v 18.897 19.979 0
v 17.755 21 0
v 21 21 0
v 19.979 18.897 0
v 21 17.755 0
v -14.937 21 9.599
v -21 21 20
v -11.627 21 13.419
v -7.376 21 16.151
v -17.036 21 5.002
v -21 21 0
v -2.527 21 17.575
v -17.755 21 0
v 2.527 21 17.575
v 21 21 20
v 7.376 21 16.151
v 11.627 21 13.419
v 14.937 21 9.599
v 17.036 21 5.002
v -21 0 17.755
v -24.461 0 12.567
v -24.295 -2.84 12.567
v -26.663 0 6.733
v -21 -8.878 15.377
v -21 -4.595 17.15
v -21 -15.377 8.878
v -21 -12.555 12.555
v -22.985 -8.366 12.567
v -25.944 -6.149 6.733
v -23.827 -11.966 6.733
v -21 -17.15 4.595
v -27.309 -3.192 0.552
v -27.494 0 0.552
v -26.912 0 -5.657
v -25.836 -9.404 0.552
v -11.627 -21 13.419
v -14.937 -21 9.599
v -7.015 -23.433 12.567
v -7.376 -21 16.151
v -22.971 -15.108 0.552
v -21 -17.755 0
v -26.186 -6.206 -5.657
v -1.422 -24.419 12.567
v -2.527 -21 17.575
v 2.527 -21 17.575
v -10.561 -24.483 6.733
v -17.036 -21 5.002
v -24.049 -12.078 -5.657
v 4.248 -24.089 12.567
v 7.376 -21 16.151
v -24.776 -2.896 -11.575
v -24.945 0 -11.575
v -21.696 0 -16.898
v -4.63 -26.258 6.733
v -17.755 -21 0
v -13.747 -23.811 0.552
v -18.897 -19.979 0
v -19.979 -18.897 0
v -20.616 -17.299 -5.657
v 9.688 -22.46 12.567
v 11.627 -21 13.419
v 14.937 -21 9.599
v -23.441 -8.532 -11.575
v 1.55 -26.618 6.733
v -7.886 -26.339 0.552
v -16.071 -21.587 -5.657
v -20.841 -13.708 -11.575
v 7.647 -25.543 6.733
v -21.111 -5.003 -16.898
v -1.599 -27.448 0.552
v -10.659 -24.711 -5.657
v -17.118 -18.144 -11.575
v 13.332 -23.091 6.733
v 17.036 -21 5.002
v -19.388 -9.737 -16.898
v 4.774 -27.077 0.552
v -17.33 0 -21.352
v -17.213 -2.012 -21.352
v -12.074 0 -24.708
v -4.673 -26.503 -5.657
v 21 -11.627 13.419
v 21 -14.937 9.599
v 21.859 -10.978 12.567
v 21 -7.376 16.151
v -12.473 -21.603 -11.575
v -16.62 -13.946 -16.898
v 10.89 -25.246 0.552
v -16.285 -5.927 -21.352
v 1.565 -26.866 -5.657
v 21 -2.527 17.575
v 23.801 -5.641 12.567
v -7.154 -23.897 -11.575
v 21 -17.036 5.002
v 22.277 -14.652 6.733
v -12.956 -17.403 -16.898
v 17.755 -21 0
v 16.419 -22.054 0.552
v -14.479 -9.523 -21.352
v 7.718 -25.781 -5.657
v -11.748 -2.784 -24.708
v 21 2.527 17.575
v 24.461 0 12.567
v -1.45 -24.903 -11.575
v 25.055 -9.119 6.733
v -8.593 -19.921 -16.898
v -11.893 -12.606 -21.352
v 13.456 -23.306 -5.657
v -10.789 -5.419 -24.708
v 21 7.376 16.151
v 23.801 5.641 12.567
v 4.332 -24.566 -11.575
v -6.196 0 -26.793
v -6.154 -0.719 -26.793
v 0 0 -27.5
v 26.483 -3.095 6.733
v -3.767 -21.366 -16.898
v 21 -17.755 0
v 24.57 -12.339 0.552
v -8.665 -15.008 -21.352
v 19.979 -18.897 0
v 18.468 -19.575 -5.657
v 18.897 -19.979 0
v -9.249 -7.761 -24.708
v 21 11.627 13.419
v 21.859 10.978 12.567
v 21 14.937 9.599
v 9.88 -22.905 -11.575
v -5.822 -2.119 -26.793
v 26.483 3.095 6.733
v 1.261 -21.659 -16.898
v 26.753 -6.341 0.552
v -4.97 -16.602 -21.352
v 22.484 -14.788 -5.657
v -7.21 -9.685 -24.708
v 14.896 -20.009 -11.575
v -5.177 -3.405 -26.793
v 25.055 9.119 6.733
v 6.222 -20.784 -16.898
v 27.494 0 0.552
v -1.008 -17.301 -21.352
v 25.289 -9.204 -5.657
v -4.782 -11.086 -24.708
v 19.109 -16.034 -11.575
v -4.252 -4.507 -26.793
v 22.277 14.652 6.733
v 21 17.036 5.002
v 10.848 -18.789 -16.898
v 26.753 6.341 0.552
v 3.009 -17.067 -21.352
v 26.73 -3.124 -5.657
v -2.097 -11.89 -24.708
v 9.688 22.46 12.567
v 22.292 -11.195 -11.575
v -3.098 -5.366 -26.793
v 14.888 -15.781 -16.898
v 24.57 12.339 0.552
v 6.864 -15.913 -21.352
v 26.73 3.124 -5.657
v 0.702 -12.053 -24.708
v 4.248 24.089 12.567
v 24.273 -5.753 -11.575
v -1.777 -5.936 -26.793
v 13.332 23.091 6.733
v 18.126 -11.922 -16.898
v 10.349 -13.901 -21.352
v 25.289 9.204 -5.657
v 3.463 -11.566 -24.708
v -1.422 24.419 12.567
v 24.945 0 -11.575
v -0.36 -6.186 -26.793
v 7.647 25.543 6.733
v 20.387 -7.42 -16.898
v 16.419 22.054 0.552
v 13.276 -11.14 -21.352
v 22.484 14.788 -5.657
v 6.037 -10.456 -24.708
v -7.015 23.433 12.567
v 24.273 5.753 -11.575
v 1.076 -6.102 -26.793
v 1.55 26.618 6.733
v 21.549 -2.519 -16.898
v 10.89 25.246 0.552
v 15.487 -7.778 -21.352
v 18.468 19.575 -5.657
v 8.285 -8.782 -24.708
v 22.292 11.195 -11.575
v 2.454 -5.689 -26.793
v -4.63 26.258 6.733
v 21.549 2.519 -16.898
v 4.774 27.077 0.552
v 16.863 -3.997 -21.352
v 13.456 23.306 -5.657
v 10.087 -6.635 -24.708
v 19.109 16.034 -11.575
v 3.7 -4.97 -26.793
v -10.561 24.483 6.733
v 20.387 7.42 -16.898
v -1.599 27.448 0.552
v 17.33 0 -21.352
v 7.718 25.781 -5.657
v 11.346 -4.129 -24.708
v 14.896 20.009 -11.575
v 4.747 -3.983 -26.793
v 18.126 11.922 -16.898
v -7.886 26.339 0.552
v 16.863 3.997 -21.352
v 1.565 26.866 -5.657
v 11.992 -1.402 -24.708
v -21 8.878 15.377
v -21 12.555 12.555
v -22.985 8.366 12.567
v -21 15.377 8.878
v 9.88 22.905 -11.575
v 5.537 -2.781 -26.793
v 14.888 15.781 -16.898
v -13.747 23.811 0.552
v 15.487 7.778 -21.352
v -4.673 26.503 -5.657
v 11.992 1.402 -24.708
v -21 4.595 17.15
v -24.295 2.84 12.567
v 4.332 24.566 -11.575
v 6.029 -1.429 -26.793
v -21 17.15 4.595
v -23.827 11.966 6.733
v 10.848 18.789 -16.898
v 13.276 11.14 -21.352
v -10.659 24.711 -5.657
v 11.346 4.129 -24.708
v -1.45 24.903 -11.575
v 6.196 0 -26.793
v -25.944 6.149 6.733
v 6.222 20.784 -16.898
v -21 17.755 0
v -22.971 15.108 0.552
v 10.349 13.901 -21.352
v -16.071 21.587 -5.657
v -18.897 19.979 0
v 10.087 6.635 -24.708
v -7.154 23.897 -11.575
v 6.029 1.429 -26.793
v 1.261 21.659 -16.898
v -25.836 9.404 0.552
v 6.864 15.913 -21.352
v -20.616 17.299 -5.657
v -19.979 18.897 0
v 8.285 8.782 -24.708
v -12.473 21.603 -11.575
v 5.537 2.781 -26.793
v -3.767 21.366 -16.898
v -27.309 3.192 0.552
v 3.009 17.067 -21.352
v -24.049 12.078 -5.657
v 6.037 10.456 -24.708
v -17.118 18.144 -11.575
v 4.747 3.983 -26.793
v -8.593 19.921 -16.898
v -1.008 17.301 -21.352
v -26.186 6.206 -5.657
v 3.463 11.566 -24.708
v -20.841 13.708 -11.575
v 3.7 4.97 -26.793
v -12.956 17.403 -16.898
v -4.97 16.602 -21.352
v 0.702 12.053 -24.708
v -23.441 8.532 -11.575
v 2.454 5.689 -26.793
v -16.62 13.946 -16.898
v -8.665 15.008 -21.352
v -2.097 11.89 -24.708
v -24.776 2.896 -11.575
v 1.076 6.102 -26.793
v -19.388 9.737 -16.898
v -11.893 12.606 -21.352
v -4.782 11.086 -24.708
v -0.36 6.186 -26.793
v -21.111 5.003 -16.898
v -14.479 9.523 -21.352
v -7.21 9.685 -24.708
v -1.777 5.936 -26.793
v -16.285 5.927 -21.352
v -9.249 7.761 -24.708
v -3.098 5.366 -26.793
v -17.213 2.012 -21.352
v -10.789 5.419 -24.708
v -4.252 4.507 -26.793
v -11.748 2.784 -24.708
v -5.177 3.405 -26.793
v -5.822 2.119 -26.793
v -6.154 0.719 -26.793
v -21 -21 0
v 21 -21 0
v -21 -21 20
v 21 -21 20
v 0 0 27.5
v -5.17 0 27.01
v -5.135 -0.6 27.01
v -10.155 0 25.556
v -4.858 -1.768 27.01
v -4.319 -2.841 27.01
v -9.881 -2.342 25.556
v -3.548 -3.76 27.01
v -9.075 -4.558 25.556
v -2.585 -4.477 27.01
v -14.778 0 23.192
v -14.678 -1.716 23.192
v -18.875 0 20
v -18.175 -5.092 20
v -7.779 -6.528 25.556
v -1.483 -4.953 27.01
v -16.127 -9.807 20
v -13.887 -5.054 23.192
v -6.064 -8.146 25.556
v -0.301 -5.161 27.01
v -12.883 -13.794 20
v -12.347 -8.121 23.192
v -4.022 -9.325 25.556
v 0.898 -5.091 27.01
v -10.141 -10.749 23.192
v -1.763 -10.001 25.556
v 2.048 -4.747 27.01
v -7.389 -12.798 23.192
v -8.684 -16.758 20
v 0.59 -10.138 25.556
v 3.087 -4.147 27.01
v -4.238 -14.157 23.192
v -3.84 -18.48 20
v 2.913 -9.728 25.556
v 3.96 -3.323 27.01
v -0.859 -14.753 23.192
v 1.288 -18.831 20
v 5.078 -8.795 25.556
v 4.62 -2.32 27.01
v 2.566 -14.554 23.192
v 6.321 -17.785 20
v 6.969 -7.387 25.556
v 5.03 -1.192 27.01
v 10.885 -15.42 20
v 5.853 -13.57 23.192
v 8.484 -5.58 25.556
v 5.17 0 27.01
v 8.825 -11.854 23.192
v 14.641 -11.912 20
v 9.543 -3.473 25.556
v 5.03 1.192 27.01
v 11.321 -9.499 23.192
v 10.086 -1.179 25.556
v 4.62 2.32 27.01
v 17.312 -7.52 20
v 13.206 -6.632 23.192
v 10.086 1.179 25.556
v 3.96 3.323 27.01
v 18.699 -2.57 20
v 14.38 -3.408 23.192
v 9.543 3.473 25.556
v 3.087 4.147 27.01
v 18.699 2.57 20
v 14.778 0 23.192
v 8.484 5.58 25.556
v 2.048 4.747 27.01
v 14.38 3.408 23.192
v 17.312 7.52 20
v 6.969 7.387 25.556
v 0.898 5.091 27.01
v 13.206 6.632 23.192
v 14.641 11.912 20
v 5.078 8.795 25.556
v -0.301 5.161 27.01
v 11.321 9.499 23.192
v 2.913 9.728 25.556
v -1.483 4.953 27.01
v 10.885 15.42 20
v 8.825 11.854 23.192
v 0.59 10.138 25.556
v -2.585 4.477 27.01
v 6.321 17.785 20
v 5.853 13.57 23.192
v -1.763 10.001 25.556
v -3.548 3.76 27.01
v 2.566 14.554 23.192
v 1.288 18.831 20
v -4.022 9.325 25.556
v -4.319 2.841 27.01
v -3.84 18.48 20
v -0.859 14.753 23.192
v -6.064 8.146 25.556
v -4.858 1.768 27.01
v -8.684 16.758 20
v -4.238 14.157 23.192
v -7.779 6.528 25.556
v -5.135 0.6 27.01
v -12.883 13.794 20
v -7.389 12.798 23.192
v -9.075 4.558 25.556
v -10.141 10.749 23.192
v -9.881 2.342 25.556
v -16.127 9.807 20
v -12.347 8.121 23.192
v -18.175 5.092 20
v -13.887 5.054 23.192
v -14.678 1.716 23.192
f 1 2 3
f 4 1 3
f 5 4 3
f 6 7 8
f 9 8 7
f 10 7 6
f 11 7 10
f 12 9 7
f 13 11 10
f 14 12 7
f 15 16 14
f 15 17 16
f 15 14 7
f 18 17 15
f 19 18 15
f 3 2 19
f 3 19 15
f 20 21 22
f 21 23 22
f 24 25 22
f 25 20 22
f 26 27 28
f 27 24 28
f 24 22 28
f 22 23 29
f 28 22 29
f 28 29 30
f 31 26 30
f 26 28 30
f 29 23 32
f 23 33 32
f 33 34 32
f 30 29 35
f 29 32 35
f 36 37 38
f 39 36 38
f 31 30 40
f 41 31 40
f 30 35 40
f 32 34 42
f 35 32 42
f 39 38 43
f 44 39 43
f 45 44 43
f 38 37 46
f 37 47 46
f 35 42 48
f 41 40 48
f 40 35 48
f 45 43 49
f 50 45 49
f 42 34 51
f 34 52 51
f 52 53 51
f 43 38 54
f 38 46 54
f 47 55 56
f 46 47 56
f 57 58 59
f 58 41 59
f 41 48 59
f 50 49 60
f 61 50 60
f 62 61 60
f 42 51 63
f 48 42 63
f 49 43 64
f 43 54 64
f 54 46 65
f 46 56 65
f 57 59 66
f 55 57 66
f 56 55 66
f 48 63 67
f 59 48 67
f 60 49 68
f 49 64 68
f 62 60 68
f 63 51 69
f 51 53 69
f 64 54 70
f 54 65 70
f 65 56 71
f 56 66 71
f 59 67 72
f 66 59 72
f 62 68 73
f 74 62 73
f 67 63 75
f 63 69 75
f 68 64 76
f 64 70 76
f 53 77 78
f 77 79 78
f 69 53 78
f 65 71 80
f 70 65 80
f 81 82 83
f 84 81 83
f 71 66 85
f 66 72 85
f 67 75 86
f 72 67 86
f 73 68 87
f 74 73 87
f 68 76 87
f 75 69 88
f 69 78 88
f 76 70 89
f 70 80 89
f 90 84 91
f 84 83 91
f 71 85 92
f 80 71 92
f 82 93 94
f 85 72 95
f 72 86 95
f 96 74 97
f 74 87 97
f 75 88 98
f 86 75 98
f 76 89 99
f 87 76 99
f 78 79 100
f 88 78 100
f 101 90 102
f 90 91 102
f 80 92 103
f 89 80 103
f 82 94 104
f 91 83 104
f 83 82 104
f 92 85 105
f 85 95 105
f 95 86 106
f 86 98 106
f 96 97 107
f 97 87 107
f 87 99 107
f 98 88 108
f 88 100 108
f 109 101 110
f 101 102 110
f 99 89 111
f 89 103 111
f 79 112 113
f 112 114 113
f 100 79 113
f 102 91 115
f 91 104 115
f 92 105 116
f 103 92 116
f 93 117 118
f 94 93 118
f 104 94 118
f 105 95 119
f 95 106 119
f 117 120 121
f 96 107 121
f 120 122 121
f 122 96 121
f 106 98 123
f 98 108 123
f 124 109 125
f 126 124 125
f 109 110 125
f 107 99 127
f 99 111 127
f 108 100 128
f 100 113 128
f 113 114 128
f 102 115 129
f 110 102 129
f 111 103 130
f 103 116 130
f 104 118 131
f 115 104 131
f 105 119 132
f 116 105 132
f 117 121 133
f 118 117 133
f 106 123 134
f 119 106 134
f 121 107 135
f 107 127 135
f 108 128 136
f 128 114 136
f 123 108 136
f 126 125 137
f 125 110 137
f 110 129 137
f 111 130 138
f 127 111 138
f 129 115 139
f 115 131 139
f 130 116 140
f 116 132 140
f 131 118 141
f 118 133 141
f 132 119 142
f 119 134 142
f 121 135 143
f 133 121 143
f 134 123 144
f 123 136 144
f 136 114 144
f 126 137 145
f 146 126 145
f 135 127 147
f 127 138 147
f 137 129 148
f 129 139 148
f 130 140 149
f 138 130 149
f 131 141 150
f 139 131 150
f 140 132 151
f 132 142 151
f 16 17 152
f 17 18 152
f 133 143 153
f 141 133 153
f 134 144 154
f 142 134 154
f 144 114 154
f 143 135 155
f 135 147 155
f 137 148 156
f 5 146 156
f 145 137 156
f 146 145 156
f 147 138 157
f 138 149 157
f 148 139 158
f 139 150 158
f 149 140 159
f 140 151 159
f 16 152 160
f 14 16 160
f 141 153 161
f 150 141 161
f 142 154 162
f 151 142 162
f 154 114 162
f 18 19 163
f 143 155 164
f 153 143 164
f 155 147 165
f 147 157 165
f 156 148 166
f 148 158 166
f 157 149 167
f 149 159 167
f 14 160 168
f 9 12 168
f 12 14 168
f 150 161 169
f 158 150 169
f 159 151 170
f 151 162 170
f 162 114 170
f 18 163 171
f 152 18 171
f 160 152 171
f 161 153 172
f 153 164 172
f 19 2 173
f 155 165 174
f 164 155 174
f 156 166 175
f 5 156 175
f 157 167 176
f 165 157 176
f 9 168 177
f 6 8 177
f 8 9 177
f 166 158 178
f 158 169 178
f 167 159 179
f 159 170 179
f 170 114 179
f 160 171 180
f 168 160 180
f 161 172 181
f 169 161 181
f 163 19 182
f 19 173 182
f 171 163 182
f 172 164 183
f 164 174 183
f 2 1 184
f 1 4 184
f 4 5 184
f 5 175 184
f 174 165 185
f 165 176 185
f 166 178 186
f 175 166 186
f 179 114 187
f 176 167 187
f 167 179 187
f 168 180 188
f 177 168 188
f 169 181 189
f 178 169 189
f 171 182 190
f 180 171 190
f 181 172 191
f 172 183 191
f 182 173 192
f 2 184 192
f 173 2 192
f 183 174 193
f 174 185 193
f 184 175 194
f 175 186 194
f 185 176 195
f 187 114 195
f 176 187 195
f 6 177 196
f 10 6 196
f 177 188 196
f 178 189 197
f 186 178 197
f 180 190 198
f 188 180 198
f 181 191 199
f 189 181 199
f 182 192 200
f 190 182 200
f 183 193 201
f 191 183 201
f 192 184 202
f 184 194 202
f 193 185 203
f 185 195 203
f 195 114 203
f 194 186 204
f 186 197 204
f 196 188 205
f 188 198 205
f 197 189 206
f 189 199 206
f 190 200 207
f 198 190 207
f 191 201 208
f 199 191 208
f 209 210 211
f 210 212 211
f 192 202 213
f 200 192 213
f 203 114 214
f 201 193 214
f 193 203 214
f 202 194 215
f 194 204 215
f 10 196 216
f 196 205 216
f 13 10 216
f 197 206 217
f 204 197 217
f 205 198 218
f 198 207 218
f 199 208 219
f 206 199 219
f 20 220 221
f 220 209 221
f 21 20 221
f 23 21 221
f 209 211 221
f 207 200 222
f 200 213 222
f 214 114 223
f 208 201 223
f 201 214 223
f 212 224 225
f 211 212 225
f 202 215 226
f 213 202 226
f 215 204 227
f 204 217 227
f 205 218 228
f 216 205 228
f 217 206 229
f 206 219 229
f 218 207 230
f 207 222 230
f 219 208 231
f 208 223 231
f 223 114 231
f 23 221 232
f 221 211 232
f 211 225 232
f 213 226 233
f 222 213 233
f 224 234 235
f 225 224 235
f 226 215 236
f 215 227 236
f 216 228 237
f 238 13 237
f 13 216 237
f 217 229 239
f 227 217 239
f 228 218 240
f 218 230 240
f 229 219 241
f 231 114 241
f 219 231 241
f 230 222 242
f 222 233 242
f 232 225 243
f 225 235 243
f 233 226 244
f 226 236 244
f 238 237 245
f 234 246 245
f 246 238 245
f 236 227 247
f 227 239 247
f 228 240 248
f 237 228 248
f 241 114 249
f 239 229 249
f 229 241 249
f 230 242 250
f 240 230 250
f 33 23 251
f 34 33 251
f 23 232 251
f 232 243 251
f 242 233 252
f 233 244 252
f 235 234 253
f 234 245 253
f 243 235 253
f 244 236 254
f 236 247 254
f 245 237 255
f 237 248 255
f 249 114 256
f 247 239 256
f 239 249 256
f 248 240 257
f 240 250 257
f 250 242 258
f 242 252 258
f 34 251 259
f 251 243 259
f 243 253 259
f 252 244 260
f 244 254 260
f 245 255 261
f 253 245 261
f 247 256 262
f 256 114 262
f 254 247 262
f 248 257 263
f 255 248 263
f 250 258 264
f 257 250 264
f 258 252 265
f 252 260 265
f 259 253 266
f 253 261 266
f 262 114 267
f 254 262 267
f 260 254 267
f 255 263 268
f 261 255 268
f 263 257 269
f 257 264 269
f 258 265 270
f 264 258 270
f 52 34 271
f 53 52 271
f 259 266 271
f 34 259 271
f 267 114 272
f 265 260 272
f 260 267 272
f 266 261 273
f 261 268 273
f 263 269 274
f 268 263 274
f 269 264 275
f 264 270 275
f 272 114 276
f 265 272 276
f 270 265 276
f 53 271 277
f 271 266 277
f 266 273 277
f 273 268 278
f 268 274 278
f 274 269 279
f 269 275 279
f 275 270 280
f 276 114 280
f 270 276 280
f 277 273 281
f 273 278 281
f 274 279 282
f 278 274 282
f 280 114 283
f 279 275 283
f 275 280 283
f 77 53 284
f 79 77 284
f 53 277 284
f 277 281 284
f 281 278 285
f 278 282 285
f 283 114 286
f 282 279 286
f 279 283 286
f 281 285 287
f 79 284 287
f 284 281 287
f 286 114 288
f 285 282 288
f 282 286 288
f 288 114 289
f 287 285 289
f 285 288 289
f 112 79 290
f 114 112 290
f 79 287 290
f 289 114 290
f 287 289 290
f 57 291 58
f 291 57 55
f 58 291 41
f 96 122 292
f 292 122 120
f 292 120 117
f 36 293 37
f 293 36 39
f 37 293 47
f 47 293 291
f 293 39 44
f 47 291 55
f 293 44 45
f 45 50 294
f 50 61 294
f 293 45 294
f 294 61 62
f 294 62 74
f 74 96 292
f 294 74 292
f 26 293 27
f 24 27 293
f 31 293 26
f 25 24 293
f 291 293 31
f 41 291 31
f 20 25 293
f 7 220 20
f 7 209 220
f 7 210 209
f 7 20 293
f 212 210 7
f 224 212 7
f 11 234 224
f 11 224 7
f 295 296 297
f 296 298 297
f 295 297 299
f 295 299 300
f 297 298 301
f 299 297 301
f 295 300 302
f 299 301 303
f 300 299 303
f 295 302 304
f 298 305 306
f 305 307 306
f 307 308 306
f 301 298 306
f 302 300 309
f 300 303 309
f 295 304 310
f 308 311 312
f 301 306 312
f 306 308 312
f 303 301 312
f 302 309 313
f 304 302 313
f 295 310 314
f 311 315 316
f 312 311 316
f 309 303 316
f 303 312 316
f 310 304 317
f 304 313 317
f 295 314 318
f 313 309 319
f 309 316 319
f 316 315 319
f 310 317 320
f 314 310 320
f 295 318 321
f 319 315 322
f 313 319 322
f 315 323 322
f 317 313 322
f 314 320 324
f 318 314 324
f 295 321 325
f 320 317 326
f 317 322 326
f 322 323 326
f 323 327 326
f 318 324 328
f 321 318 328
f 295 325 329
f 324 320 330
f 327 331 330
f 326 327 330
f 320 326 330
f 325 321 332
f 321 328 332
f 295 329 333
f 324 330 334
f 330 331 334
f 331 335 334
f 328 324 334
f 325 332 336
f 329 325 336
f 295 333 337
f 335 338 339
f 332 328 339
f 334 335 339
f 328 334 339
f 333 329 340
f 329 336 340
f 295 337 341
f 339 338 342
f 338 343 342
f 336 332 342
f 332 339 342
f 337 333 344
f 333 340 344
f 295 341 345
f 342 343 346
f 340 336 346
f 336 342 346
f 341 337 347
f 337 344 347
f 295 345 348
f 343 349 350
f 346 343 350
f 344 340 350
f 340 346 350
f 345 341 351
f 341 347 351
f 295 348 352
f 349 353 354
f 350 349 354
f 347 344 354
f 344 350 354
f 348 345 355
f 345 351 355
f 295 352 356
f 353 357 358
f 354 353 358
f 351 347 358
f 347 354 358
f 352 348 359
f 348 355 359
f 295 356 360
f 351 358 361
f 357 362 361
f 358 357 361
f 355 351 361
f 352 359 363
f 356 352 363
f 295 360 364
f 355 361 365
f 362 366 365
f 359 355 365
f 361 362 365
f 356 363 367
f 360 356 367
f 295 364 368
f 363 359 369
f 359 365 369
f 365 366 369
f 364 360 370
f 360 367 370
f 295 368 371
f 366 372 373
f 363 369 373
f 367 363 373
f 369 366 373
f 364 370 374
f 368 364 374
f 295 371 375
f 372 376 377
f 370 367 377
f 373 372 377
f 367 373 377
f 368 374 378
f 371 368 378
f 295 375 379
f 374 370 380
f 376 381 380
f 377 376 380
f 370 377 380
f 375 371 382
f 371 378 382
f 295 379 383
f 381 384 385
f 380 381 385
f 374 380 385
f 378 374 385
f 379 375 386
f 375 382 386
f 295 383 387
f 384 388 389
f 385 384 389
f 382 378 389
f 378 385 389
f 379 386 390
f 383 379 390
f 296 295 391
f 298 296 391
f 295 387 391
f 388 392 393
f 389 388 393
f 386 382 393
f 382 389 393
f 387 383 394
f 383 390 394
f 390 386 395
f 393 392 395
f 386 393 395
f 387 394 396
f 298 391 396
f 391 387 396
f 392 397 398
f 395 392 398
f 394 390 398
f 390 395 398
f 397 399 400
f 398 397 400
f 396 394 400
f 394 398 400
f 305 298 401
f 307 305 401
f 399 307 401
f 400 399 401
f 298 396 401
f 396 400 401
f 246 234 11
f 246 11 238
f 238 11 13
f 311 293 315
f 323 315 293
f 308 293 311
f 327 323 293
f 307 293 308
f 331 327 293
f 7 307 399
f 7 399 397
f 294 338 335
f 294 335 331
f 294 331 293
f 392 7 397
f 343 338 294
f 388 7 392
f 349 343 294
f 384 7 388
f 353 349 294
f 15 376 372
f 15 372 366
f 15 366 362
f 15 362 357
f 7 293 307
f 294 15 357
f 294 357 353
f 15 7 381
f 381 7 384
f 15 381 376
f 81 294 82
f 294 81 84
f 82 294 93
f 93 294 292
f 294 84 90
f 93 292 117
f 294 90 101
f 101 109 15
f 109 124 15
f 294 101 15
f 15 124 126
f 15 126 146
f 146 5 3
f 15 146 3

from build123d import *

# Parameters (mm, degrees)
F2_W     = 42
F2_H     = 42
F3_DEPTH = 20


with BuildPart() as f1:
    # F0 (on Front) → F1 (revolve)
    with BuildSketch(Plane.XZ):
        with BuildLine():
            Line((0, -27.5), (0, 27.5))
            ThreePointArc((0, 27.5), (-27.5, 0), (0, -27.5))
        make_face()
    revolve(axis=Axis((0, 0, 0.613028), (0, 0, 1)))

    # F2 (on Top) → F3 (join)
    with BuildSketch(Plane.XY):
        Rectangle(F2_W, F2_H)
    extrude(amount=F3_DEPTH)


solid = f1.part
